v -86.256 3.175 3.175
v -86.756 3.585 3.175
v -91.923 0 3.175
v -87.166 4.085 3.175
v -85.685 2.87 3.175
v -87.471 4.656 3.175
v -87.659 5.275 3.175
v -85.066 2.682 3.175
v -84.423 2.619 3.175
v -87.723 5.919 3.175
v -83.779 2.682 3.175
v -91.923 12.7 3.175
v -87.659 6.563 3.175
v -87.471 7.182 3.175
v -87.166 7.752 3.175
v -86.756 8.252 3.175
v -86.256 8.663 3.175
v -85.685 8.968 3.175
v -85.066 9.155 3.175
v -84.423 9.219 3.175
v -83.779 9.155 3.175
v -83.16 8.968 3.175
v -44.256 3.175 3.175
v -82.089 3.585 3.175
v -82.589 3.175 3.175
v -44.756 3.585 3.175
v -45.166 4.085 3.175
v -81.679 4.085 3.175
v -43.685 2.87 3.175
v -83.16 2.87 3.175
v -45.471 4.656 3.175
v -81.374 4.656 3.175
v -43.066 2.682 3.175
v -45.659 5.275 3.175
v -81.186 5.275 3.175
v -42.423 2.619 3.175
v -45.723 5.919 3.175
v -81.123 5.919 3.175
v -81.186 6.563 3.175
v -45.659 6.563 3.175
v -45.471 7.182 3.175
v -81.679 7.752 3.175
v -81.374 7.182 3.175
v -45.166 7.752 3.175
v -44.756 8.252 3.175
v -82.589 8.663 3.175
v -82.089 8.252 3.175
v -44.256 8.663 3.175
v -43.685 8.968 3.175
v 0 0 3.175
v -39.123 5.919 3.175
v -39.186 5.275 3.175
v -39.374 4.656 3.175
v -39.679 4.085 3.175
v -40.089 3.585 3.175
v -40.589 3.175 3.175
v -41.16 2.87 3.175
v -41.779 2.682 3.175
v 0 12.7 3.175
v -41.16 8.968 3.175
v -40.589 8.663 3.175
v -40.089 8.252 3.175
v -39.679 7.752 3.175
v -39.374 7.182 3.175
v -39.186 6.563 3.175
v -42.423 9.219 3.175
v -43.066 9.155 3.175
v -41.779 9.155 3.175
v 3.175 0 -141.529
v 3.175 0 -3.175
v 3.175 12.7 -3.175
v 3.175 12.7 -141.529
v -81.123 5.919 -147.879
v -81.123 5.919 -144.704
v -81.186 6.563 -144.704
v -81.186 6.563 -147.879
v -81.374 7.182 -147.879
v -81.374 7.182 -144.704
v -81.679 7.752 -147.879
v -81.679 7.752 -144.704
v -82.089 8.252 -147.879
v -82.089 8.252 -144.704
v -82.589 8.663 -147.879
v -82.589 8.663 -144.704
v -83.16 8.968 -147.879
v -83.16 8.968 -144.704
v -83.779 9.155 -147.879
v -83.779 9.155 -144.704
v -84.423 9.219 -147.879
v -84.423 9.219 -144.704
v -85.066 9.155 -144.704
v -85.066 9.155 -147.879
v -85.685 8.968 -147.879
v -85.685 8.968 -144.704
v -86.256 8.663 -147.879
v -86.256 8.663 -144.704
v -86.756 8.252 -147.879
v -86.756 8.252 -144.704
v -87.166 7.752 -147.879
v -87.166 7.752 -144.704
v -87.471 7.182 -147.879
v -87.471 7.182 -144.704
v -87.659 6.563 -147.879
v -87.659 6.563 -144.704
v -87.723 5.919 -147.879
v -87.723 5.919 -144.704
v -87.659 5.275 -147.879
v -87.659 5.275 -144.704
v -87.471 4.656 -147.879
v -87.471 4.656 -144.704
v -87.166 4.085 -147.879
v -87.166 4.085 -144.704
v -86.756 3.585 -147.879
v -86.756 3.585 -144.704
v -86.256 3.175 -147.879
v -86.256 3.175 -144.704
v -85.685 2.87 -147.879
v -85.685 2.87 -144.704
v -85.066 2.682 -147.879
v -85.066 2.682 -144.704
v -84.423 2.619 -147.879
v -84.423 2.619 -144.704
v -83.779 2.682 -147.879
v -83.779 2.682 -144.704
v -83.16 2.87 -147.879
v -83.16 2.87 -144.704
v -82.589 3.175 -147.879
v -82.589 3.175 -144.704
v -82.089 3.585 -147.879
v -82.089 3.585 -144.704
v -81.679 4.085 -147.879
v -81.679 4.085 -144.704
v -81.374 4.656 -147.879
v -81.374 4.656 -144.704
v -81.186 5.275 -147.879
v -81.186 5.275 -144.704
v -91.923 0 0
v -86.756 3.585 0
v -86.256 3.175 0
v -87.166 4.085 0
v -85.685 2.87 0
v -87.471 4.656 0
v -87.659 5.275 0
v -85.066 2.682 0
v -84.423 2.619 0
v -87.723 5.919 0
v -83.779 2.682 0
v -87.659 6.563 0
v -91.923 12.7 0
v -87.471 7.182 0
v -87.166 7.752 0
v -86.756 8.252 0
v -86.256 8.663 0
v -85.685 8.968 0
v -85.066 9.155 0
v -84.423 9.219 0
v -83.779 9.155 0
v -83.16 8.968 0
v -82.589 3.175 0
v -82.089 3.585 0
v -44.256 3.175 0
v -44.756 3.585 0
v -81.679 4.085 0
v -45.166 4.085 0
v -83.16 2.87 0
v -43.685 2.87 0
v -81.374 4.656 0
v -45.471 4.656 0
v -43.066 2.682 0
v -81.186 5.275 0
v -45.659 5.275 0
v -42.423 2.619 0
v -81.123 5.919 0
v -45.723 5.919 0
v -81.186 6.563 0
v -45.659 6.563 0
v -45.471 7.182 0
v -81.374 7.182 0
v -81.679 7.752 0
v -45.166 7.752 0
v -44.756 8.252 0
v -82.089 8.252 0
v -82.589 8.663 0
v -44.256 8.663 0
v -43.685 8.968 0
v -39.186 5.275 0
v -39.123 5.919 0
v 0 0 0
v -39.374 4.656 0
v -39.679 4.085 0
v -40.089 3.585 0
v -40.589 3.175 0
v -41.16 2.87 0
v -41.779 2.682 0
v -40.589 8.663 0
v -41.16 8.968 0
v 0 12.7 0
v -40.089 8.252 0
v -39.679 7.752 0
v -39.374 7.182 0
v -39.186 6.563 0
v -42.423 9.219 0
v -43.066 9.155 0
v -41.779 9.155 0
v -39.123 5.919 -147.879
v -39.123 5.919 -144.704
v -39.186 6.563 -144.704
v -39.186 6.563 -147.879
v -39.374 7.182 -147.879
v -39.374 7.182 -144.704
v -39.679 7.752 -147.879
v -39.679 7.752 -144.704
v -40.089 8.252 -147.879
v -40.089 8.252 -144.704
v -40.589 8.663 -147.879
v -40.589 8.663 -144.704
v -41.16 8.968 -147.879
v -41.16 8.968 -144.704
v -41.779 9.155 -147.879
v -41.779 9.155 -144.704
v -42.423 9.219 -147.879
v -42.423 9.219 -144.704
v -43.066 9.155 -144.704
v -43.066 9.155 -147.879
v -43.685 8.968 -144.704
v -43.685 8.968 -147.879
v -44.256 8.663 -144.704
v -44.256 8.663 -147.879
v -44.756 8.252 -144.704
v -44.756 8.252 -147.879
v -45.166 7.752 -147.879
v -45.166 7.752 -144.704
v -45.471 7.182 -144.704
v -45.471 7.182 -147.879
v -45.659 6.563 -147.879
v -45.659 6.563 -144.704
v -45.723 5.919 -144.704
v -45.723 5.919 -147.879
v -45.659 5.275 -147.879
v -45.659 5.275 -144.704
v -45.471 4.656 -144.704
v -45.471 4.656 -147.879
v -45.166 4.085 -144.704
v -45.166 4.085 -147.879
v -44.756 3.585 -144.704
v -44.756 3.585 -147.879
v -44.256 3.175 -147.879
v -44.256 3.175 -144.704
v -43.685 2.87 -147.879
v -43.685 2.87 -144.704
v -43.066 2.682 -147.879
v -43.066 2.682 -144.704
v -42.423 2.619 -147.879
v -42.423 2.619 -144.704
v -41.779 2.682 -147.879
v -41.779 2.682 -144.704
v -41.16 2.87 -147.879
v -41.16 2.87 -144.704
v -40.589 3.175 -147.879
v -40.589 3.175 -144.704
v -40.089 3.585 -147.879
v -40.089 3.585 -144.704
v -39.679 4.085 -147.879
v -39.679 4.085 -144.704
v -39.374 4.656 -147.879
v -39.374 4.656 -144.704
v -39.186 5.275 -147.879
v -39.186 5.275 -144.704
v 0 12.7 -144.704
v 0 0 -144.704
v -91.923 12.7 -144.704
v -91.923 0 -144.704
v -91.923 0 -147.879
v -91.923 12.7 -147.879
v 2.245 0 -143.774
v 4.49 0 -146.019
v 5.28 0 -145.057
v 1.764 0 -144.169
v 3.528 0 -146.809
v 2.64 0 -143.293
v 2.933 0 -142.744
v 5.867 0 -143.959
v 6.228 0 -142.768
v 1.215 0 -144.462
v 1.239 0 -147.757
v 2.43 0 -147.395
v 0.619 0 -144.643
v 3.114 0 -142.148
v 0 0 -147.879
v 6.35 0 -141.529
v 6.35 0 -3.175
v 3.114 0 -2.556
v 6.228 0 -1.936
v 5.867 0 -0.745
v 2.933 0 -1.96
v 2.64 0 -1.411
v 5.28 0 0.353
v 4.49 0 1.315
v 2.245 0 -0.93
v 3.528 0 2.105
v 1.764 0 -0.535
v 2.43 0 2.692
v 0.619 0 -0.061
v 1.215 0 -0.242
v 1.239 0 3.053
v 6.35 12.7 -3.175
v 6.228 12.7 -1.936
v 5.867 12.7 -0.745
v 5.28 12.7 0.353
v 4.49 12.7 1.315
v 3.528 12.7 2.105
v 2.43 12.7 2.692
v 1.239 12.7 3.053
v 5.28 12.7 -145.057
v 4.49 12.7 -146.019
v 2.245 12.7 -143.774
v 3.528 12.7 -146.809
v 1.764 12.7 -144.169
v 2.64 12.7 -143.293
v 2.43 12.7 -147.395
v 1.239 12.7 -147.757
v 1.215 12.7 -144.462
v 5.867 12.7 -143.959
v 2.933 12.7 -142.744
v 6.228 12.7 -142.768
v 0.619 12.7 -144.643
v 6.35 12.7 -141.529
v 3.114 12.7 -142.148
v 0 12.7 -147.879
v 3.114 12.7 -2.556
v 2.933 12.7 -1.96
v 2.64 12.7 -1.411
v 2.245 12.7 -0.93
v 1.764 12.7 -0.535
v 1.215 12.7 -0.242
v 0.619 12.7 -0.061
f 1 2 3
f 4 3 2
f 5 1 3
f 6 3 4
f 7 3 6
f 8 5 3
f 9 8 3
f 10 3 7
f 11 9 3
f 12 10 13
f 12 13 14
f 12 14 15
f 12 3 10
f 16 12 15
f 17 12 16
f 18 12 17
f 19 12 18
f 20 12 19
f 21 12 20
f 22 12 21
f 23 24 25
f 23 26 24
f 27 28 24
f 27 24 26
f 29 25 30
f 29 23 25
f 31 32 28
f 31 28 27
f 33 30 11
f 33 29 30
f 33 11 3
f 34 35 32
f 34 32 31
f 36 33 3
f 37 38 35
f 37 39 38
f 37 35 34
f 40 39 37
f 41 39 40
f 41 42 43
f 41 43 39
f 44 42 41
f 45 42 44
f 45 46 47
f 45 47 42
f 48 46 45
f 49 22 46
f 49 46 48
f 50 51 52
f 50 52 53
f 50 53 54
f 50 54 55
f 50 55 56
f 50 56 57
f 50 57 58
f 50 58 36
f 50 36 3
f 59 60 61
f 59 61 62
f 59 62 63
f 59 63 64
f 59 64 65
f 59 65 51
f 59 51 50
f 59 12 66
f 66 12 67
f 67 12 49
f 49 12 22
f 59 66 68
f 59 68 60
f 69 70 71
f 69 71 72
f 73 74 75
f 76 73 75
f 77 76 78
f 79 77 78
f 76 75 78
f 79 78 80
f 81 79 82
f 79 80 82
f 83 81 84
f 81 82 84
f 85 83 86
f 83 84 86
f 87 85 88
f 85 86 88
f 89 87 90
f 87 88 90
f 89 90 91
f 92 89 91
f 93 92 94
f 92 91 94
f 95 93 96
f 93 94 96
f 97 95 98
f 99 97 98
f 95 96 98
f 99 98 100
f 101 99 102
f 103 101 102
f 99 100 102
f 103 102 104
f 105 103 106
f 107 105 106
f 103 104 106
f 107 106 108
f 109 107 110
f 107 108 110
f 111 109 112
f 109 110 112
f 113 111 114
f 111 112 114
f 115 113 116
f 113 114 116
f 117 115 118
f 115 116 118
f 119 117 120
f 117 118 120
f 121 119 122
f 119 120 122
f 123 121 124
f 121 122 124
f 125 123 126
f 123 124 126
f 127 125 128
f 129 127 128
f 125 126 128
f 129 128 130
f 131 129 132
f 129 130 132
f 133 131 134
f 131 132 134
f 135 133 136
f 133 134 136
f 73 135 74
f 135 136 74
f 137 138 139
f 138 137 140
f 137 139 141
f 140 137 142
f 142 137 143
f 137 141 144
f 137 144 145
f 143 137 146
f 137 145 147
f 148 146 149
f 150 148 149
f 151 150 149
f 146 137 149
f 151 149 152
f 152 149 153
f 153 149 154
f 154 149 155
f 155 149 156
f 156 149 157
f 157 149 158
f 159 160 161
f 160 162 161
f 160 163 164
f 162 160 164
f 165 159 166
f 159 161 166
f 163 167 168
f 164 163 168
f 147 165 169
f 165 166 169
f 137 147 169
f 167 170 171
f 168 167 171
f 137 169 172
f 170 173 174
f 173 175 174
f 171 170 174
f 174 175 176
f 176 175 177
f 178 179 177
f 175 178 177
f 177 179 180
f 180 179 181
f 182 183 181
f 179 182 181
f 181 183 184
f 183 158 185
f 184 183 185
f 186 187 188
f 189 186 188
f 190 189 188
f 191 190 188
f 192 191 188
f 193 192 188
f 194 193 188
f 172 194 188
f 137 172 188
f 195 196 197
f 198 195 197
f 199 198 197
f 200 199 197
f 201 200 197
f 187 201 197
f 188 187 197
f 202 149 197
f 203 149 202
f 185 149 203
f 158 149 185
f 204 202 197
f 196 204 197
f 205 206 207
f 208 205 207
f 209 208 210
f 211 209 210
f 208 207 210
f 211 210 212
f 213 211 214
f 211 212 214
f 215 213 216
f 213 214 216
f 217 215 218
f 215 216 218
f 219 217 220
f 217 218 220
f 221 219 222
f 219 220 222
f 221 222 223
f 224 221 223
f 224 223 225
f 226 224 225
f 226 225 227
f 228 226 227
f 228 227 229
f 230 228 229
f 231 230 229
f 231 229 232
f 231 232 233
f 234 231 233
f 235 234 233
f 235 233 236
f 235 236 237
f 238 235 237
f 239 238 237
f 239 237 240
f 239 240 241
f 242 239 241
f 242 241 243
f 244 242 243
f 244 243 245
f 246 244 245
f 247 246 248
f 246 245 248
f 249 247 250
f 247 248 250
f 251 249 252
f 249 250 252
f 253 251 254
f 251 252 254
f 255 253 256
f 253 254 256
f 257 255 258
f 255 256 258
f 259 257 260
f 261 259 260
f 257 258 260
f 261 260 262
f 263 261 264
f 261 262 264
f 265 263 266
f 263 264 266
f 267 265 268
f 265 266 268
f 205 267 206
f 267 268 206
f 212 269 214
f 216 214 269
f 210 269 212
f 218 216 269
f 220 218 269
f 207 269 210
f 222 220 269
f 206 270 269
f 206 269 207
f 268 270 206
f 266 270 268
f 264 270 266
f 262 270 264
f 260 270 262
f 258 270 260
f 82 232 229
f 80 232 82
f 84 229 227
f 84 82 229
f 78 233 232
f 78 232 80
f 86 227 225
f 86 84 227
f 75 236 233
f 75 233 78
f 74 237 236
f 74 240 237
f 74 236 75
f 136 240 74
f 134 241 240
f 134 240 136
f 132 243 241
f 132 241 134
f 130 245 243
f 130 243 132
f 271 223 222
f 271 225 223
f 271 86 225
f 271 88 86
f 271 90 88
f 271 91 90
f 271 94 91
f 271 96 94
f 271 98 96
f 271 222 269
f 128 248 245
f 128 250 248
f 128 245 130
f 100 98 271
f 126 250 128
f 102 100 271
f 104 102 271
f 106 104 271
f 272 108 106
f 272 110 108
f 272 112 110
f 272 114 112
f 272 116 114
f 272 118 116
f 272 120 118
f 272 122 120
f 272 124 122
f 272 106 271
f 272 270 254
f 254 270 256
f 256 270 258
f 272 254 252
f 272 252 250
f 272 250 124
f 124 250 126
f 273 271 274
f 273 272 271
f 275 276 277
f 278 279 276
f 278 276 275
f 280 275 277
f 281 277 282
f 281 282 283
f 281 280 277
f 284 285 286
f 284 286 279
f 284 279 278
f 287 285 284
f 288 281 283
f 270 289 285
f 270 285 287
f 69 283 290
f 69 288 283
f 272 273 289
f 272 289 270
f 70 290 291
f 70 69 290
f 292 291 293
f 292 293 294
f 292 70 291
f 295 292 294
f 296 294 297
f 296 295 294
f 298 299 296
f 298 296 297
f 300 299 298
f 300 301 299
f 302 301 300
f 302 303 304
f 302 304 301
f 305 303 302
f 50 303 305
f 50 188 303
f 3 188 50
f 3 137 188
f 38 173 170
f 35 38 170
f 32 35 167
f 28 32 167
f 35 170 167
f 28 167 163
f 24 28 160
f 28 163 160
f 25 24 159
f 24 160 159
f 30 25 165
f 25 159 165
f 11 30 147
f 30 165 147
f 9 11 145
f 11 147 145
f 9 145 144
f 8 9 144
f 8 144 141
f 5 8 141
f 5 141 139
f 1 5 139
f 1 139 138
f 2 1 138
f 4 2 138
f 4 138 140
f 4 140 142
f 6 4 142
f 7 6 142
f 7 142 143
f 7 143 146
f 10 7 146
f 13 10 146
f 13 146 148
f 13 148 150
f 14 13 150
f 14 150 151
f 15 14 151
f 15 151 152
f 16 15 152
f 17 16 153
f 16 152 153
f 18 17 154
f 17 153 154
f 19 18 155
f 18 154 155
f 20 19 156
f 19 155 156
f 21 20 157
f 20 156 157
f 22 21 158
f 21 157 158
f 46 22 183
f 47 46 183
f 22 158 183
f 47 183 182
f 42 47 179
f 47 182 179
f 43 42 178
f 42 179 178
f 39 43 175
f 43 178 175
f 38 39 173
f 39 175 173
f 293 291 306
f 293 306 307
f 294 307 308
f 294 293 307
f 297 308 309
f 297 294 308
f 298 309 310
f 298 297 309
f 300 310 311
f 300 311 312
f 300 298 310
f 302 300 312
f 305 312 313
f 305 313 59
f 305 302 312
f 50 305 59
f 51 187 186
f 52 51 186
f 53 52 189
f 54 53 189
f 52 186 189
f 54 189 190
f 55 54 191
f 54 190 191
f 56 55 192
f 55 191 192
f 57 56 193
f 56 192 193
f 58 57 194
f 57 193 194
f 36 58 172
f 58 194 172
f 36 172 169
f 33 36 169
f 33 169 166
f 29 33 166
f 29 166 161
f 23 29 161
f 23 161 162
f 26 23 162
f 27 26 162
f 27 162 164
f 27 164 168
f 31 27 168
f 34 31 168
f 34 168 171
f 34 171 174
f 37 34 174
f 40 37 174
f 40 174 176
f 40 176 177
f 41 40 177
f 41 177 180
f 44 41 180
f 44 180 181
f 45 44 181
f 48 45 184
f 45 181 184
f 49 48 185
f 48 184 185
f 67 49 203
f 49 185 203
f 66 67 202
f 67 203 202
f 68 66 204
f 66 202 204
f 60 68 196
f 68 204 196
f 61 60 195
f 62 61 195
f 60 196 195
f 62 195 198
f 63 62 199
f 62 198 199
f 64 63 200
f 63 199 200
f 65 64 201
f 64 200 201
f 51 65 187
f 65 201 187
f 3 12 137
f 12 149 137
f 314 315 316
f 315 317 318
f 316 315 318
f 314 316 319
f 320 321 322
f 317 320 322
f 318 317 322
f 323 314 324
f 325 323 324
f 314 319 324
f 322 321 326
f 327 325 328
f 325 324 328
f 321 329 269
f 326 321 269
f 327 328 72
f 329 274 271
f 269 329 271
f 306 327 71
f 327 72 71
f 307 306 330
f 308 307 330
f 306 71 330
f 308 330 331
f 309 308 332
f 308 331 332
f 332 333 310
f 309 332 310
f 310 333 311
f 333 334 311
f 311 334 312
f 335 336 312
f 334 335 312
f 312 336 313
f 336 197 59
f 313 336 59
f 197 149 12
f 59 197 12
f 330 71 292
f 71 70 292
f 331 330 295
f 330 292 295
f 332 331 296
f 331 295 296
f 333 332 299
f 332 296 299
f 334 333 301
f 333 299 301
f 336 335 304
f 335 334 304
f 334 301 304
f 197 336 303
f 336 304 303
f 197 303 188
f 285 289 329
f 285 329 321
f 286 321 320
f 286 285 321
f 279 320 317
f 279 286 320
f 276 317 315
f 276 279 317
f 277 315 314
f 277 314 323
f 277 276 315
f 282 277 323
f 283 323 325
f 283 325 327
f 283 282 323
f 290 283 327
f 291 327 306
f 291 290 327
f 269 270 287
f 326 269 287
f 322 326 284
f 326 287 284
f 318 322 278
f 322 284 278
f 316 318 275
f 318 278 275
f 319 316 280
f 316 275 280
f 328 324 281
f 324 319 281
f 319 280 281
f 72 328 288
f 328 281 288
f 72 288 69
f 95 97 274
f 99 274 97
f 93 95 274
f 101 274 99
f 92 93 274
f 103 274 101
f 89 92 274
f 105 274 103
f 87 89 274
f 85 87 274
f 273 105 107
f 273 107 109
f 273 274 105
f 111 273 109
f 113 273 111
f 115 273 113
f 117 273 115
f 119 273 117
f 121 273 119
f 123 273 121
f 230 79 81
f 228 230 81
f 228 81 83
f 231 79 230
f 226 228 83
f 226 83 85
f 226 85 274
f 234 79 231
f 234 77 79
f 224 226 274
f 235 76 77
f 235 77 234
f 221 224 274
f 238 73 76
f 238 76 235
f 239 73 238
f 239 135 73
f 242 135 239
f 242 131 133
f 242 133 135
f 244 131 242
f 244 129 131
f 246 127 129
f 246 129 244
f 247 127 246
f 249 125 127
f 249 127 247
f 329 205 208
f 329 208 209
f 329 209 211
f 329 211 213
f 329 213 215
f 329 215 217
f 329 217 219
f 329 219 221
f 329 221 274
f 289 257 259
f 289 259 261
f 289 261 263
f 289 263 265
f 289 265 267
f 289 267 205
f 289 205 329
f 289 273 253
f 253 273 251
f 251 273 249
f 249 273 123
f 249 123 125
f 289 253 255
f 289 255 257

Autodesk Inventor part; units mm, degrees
ref_plane "YZ Plane" through (0, 0, 0) normal (1, 0, 0) x (0, 1, 0)
ref_plane "XZ Plane" through (0, 0, 0) normal (0, 1, 0) x (-1, 0, 0)
ref_plane "XY Plane" through (0, 0, 0) normal (0, 0, 1) x (1, 0, 0)
sketch "Sketch1" plane through (0, 0, 0) normal (0, 0, 1) x (1, 0, 0)
  line L0 (0, 0) -> (336.562362, 0)
  line L1 (336.562362, -12.7) -> (0, -12.7)
  line L2 (0, 0) -> (95.513688, 0)
  line L3 (95.513688, 0) -> (95.513688, -1.5875)
  line L4 (95.513688, -1.5875) -> (94.719938, -1.5875)
  line L5 (94.719938, -1.5875) -> (94.719938, 0)
  line L6 (95.513688, -1.5875) -> (96.307438, -1.5875)
  line L7 (96.307438, -1.5875) -> (96.307438, 0)
  line L8 (95.513688, -12.7) -> (95.513688, -11.1125)
  line L9 (95.513688, -11.1125) -> (94.719938, -11.1125)
  line L10 (94.719938, -11.1125) -> (94.719938, -12.7)
  line L11 (95.513688, -11.1125) -> (96.307438, -11.1125)
  line L12 (96.307438, -11.1125) -> (96.307438, -12.7)
  line L13 (336.562362, 0) -> (241.058362, 0)
  line L14 (241.058362, 0) -> (241.058362, -1.5875)
  line L15 (241.058362, -1.5875) -> (241.852112, -1.5875)
  line L16 (241.852112, -1.5875) -> (241.852112, 0)
  line L17 (241.058362, -1.5875) -> (240.264612, -1.5875)
  line L18 (240.264612, -1.5875) -> (240.264612, 0)
  line L19 (241.058362, -12.7) -> (241.058362, -11.1125)
  line L20 (241.058362, -11.1125) -> (241.852112, -11.1125)
  line L21 (241.852112, -11.1125) -> (241.852112, -12.7)
  line L22 (241.058362, -11.1125) -> (240.264612, -11.1125)
  line L23 (240.264612, -11.1125) -> (240.264612, -12.7)
  dimension "d1" = 91.9226
sketch "Sketch1 outline for Plate5" plane through (0, 0, 0) normal (0, 0, 1) x (1, 0, 0)
  line L0 (-91.9226, 0) -> (0, 0)
  line L1 (-91.9226, 12.7) -> (-91.9226, 0)
  line L2 (-84.4296, 12.7) -> (-91.9226, 12.7)
  line L3 (-42.418, 12.7) -> (-84.4296, 12.7)
  line L4 (0, 12.7) -> (-42.418, 12.7)
  line L5 (0, 0) -> (0, 12.7)
extrude "Plate5" add sketch "Sketch1 outline for Plate5" along normal blind 3.175
sketch "Sketch6" plane through (3.175, 0, -3.175) normal (1, 0, 0) x (0, 1, 0)
  line L0 (12.7, 0) -> (0, 0)
  line L1 (0, 0) -> (0, -138.3538)
  line L2 (0, -138.3538) -> (12.7, -138.3538)
  line L3 (12.7, -138.3538) -> (12.7, 0)
edge flange "Flange4" height 144.7038 angle 90 thickness 3.175 bend radius 3.175 thickness toward (1, 0, 0) relief tear relief width 3.175 relief depth 1.5875 edges at (0, 6.35, 0) wall of the first edge with corners at (3.175, 12.7, -3.175) (3.175, 0, -3.175) (3.175, 0, -141.5288) (3.175, 12.7, -141.5288)
bend "Bend4"
corner "Corner4"
sketch "Sketch7" plane through (0, 0, -144.7038) normal (0, 0, -1) x (-1, 0, 0)
  line L0 (0, 12.7) -> (0, 0)
  line L1 (0, 0) -> (91.9226, 0)
  line L2 (91.9226, 0) -> (91.9226, 12.7)
  line L3 (91.9226, 12.7) -> (0, 12.7)
edge flange "Flange5" height 98.2726 angle 90 thickness 3.175 bend radius 3.175 thickness toward (0, 0, -1) relief tear relief width 3.175 relief depth 1.5875 edges at (3.175, 6.35, -141.5288) wall of the first edge with corners at (0, 12.7, -144.7038) (0, 0, -144.7038) (-91.9226, 0, -144.7038) (-91.9226, 12.7, -144.7038)
bend "Bend5"
corner "Corner5"
sketch "Sketch9" plane through (0, 0, 3.175) normal (0, 0, 1) x (1, 0, 0)
  circle A0 centre (-42.4226, 501.2188) radius 3.3 projected
  circle A1 centre (-84.4226, 501.2188) radius 3.3 projected
extrude "Extrusion3" cut sketch "Sketch9" against normal blind 25374.6
sketch "Sketch10" plane through (-91.9226, 0, -144.7038) normal (0, 0, 1) x (1, 0, 0)
  line L0 (45, 276.1188) -> (45, -384.2812)
  circle A0 centre (7.5, 5.9188) radius 3.3
  circle A1 centre (49.5, 5.9188) radius 3.3
extrude "Extrusion4" cut sketch "Sketch10" along normal mid plane 25374.6
sketch "Sketch2" plane through (336.562362, -12.7, 0) normal (0, 0, 1) x (1, 0, 0)
  line L0 (-95.504, 12.7) -> (0, 12.7)
  line L1 (-95.504, 12.7) -> (-95.504, 11.1125)
  line L2 (-241.048674, 11.1125) -> (-241.048674, 12.7)
  line L3 (-336.562362, 12.7) -> (-241.048674, 12.7)
  line L4 (-241.048674, 12.7) -> (-241.842424, 12.7)
  line L5 (-241.842424, 12.7) -> (-241.842424, 11.1125)
  line L6 (-241.842424, 11.1125) -> (-241.048674, 11.1125)
  line L7 (-95.504, 12.7) -> (-94.71025, 12.7)
  line L8 (-95.504, 11.1125) -> (-94.71025, 11.1125)
  line L9 (-94.71025, 11.1125) -> (-94.71025, 12.7)
  dimension "d14" = 0.79375
  dimension "d15" = 0.79375
equation "\"d43\" = BendReliefWidth"
equation "\"d44\" = BendReliefDepth"
equation "\"d45\" = MinimumRemnant"
equation "\"d46\" = BendRadius"
equation "\"d49\" = BendRadius"
equation "\"d50\" = CornerReliefSize"
equation "\"d51\" = GapSize"
equation "\"d52\" = JacobiRadiusSize"
equation "\"d53\" = BendReliefWidth"
equation "\"d54\" = BendReliefDepth"
equation "\"d55\" = MinimumRemnant"
equation "\"d56\" = BendRadius"
equation "\"d59\" = BendRadius"
equation "\"d60\" = CornerReliefSize"
equation "\"d61\" = GapSize"
equation "\"d62\" = JacobiRadiusSize"
equation "\"BendRadius\" = Thickness"
equation "\"BendReliefWidth\" = Thickness"
equation "\"BendReliefDepth\" = 0.5 * Thickness"
equation "\"CornerReliefSize\" = 4 * Thickness"
equation "\"MinimumRemnant\" = 2 * Thickness"
equation "\"TransitionRadius\" = BendRadius"
equation "\"JacobiRadiusSize\" = BendRadius"
equation "\"GapSize\" = Thickness"
equation "\"d8\" = BendRadius"
equation "\"d42\" = BendRadius"
equation "\"Thickness\" = 3.175"
properties part number "tie-together tier 1" material "Aluminum 6061"
